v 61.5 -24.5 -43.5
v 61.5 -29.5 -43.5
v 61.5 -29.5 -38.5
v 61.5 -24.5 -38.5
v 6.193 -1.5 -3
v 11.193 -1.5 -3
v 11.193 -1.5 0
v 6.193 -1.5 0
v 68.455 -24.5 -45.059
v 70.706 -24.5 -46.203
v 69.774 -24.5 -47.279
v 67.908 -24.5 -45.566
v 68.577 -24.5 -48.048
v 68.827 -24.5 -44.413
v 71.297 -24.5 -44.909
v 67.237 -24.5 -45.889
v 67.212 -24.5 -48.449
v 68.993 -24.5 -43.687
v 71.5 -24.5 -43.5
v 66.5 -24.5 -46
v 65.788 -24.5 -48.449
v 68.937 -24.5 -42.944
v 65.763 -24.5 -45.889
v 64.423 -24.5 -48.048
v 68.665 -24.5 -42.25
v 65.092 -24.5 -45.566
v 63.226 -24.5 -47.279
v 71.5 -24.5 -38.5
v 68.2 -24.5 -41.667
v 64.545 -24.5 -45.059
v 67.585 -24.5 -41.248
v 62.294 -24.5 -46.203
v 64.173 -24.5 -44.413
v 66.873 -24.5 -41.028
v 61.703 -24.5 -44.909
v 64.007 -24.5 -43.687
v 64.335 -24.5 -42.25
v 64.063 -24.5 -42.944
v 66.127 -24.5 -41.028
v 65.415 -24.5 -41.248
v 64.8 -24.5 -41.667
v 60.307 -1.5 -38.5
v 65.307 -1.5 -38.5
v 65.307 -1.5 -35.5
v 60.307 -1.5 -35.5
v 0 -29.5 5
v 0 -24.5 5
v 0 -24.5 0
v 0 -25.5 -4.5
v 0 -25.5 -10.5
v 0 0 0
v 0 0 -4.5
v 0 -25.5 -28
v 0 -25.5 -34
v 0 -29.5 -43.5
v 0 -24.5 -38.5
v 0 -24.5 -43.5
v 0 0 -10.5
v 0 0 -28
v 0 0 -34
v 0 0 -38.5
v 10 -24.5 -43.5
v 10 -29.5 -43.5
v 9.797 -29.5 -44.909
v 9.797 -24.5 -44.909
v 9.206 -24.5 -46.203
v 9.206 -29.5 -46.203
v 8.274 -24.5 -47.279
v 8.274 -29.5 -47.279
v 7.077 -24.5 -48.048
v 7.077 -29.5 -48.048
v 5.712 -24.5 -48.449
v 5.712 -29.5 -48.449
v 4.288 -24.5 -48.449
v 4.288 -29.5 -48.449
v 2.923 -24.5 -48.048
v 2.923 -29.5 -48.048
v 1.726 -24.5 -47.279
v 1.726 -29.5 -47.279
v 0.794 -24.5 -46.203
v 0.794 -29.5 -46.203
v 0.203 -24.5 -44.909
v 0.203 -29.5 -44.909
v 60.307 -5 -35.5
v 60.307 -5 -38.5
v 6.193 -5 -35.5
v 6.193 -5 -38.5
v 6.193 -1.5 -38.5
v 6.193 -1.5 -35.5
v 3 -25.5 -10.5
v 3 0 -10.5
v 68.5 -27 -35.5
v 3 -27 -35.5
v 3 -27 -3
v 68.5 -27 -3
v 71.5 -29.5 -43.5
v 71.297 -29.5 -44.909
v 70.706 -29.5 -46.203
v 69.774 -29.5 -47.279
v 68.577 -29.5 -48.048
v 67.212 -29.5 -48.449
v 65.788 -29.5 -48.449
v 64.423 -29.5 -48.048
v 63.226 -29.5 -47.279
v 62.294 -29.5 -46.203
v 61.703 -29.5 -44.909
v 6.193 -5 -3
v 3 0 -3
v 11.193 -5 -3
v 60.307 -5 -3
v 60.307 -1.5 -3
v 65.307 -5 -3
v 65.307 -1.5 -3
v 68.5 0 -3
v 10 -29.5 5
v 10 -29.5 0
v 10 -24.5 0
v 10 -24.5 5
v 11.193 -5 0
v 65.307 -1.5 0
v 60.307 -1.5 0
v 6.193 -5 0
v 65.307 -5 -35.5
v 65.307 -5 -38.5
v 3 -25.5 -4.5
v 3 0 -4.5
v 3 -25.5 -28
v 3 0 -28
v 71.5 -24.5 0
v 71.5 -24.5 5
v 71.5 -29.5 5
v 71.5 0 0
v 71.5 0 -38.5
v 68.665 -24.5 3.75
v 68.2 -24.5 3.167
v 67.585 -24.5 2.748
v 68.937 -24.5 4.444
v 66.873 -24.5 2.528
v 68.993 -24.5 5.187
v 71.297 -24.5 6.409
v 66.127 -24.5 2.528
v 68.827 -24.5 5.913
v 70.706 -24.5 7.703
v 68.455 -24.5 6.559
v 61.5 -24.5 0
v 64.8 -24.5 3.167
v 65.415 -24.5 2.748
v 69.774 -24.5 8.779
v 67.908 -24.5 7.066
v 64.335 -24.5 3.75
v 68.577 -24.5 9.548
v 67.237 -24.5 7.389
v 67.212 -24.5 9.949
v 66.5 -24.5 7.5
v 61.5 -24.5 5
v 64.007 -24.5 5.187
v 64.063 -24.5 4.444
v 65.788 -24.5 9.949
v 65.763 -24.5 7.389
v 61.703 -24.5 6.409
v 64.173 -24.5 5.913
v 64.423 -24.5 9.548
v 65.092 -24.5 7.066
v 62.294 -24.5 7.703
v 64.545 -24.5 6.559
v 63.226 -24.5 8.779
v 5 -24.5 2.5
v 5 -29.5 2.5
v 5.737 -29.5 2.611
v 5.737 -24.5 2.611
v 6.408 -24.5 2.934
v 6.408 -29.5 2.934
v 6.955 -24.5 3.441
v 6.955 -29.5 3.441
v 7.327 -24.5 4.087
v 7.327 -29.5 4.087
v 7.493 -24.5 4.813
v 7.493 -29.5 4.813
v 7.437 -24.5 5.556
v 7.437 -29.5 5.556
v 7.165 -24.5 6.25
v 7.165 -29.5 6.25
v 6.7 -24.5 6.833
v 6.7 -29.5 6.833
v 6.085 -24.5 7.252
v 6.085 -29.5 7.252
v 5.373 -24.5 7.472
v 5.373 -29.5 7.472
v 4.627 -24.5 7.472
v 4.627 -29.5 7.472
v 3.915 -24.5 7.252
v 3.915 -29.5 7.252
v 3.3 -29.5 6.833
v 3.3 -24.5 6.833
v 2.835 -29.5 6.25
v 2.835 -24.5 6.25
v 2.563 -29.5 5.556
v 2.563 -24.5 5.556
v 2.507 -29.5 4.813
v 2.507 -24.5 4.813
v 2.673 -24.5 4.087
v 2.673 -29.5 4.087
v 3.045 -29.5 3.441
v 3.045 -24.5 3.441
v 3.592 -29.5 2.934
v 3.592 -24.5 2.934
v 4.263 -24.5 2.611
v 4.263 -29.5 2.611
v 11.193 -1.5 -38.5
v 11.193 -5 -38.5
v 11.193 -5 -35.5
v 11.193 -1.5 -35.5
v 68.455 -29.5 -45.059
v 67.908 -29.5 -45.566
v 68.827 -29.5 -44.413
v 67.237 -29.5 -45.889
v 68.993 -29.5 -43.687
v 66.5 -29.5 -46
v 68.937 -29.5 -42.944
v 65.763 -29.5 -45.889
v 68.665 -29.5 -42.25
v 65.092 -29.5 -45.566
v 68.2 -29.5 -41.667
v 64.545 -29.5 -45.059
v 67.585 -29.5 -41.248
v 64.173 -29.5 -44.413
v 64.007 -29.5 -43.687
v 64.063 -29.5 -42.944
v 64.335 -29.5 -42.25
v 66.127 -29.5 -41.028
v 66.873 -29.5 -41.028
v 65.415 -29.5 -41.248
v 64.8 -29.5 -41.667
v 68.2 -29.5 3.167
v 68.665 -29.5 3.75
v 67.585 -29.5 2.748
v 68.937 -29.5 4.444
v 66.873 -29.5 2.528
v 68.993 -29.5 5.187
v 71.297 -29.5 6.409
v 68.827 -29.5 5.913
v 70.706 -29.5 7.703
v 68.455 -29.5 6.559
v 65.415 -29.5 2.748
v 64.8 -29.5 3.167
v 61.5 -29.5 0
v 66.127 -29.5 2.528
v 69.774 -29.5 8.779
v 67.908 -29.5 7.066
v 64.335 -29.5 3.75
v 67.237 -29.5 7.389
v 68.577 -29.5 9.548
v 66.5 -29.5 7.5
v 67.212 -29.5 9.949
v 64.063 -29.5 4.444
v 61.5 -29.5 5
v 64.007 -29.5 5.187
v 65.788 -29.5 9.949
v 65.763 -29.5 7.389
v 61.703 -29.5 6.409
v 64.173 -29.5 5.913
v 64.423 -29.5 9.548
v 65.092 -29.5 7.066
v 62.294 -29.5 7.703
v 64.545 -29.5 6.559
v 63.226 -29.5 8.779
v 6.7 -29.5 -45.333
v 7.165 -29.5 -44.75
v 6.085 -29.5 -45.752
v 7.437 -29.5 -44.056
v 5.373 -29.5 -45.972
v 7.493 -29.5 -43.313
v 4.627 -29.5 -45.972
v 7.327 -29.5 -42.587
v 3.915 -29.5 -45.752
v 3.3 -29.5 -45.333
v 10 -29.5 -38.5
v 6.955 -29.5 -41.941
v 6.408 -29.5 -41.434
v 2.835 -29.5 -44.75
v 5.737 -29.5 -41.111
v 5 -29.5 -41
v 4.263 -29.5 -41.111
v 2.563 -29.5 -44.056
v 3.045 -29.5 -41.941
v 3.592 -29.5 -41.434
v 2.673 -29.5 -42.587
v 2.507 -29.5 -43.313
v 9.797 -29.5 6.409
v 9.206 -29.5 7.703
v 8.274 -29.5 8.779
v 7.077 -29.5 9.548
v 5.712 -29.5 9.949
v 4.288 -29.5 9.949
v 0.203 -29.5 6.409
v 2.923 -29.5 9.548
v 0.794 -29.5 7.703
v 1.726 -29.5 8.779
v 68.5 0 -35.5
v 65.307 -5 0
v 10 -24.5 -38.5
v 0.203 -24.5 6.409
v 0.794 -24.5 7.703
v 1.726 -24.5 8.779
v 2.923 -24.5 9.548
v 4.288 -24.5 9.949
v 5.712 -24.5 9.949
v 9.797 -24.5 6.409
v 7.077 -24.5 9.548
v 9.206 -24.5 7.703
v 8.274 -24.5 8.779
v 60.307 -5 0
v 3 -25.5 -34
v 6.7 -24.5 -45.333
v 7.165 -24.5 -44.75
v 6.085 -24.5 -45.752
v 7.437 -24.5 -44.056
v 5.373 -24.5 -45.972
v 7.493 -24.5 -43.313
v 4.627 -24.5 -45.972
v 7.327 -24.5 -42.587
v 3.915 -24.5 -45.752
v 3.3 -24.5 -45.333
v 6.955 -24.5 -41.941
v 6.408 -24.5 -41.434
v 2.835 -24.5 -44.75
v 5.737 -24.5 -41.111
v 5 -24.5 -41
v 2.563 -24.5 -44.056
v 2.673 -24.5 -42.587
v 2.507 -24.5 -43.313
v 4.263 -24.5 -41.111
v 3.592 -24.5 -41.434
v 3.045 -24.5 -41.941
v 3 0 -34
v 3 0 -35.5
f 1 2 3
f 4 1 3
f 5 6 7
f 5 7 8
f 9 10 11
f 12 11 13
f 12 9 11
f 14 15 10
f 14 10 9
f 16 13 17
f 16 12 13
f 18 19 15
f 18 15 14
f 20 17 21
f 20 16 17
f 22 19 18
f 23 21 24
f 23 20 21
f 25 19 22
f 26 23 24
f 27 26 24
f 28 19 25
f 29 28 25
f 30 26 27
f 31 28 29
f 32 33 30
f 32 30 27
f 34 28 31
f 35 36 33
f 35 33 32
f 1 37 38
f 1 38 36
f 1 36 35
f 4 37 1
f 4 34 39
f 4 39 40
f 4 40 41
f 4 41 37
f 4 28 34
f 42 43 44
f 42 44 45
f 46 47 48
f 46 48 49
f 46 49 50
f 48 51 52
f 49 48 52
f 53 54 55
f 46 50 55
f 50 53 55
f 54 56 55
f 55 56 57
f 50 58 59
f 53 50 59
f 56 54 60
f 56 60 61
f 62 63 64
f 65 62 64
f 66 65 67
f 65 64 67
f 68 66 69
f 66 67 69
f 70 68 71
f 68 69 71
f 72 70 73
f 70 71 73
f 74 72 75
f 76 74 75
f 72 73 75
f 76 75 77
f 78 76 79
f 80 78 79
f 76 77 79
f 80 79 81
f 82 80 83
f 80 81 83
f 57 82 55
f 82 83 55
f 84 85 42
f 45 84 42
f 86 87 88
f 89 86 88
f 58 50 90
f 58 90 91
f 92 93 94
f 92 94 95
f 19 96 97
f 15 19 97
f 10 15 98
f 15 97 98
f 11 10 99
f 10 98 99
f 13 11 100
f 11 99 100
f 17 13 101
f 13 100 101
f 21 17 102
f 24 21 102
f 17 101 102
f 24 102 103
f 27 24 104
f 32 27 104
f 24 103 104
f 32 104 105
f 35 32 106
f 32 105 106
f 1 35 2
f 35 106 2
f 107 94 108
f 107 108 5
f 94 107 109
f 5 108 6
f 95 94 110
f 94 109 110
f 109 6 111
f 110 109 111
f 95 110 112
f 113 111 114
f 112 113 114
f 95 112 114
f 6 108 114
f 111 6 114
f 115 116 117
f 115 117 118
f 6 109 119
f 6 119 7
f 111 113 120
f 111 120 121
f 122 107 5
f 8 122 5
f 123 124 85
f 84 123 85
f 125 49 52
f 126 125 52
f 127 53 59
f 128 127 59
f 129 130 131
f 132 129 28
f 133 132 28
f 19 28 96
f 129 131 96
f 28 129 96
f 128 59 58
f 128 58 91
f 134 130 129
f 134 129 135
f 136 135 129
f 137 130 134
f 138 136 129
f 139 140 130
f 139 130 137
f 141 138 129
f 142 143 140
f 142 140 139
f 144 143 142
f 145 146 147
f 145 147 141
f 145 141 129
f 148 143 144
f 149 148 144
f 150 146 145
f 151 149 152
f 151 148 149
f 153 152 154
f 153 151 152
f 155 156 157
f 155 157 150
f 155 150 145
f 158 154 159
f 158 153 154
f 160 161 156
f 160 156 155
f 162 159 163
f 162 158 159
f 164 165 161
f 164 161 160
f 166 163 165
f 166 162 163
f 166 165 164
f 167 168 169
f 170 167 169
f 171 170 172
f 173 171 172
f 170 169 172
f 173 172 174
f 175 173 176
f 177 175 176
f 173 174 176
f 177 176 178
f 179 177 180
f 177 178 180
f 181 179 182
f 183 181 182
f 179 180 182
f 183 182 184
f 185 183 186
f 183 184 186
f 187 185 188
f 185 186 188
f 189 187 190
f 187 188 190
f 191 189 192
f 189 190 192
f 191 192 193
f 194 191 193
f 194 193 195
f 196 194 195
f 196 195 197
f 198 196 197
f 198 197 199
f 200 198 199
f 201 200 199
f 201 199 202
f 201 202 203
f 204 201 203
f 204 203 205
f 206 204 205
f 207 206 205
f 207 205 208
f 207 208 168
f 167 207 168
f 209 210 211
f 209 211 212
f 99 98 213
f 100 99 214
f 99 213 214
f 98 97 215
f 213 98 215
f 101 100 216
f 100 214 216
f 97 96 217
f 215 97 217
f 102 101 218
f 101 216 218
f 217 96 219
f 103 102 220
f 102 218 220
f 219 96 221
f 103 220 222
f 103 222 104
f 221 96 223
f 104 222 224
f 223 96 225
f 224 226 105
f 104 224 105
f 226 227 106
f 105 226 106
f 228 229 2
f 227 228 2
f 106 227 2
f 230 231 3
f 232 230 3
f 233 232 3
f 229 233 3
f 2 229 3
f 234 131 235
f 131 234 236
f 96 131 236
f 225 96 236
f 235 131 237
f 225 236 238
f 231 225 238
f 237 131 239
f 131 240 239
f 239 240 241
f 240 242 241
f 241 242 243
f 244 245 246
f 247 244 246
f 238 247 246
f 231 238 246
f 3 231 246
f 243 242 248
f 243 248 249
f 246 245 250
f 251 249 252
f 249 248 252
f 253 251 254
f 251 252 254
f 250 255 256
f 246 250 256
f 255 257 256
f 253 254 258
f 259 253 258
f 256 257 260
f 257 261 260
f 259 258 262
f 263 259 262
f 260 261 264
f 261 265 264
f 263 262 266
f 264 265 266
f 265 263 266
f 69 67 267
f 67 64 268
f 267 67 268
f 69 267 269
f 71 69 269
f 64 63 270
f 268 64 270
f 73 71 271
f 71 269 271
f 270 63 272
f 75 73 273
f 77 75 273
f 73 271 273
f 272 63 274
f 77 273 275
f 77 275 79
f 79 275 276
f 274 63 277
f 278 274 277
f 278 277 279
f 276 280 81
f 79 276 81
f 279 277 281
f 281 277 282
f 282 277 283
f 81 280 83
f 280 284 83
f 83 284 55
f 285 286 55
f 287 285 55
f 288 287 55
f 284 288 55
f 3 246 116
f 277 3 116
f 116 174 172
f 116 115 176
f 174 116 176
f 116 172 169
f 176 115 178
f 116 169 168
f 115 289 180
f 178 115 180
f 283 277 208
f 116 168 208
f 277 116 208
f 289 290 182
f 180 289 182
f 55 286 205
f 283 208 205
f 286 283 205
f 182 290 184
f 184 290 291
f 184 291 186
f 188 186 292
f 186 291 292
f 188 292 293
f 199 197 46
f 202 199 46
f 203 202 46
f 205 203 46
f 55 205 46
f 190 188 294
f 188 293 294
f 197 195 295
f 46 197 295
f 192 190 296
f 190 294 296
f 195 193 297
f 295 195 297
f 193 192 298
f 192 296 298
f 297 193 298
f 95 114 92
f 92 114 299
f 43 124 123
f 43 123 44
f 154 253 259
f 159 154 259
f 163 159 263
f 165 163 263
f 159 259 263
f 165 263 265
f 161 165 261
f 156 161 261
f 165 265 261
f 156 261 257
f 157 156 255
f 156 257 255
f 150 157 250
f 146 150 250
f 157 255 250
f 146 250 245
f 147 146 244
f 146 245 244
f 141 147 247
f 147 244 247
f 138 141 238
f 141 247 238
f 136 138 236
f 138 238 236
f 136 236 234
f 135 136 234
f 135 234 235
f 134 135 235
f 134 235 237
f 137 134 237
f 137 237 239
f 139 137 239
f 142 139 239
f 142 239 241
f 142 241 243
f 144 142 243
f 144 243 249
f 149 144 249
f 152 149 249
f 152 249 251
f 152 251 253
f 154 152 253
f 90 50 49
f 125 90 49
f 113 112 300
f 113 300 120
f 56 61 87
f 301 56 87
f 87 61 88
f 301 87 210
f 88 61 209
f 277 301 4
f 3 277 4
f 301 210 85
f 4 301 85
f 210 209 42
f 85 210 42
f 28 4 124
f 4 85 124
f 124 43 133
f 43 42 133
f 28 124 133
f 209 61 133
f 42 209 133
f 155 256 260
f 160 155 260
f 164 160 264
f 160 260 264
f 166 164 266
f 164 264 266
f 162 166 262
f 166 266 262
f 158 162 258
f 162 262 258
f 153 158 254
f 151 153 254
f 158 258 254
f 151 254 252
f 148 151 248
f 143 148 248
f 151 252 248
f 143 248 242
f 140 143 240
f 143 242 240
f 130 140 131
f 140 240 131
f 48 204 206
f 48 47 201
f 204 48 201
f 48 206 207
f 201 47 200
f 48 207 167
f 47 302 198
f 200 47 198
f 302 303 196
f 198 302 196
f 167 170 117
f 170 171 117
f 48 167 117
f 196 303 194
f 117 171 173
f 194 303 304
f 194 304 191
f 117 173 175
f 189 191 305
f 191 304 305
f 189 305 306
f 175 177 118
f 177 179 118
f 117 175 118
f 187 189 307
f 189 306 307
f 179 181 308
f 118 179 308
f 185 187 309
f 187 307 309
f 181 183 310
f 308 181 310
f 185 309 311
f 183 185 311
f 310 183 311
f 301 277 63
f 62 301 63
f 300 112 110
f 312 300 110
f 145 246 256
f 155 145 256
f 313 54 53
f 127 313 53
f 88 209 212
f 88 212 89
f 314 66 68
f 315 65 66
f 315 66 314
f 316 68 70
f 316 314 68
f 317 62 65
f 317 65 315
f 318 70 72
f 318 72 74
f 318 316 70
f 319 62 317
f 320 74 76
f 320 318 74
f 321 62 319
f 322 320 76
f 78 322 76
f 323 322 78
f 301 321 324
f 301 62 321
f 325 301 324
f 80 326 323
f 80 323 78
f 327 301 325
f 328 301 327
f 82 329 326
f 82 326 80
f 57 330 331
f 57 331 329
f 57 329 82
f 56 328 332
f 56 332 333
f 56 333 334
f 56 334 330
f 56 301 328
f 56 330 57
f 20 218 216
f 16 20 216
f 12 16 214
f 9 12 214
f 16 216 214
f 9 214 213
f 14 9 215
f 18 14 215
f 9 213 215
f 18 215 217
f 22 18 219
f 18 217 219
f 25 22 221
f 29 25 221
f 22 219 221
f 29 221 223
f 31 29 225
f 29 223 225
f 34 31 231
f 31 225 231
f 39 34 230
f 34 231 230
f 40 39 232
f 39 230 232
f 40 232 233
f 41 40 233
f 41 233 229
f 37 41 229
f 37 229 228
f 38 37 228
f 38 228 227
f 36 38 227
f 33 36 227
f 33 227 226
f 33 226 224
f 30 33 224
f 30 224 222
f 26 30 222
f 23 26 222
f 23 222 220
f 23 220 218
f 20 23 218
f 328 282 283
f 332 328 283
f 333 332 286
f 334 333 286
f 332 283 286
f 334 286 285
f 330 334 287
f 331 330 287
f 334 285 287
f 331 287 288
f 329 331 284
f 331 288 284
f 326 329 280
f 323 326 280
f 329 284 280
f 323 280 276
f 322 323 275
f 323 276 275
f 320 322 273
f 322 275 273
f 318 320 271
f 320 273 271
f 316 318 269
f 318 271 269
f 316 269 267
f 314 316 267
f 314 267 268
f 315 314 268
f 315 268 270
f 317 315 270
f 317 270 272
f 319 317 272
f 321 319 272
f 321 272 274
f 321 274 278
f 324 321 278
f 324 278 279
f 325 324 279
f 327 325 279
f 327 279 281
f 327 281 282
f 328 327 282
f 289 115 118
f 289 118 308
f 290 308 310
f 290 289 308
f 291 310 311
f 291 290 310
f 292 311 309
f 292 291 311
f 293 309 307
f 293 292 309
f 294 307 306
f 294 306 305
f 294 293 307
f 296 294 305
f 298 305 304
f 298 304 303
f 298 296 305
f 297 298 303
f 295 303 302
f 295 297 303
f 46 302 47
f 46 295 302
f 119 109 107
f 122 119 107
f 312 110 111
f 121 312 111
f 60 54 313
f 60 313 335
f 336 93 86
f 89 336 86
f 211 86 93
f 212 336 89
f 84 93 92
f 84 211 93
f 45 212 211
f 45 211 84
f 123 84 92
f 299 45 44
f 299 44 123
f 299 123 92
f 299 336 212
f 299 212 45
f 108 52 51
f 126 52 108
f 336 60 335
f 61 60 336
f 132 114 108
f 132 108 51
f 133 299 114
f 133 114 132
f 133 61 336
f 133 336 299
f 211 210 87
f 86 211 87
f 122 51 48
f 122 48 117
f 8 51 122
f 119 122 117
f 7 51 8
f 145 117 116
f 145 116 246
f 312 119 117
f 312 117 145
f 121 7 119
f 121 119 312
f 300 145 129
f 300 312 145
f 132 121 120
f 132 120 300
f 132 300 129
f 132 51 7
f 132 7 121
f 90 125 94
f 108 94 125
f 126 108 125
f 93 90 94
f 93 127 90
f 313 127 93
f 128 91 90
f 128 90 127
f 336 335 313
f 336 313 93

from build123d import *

# Parameters (mm, degrees)
SKETCH1_W           = 71.5
SKETCH1_H           = 38.5
BOSS_EXTRUDE1_DEPTH = 29.5
SKETCH1_4_W         = 65.5
SKETCH1_4_H         = 32.5
CUT_EXTRUDE1_DEPTH  = 27
SKETCH3_W           = 6
SKETCH3_H           = 25.5
CUT_EXTRUDE2_DEPTH  = 29
BOSS_EXTRUDE3_DEPTH = 5
BOSS_EXTRUDE4_DEPTH = 5
BOSS_EXTRUDE5_DEPTH = 5
BOSS_EXTRUDE6_DEPTH = 5
SKETCH5_9_R         = 2.5
CUT_EXTRUDE3_DEPTH  = 15
SKETCH5_10_R        = 2.5
CUT_EXTRUDE4_DEPTH  = 20
SKETCH5_11_R        = 2.5
CUT_EXTRUDE5_DEPTH  = 20
SKETCH5_12_R        = 2.5
CUT_EXTRUDE6_DEPTH  = 20
SKETCH4_W           = 5
SKETCH4_H           = 3.5
CUT_EXTRUDE7_DEPTH  = 63
SKETCH4_3_W         = 5
SKETCH4_3_H         = 3.5
CUT_EXTRUDE8_DEPTH  = 63


with BuildPart() as part:
    # Sketch1 → Boss-Extrude1 (new body)
    with BuildSketch(Plane(origin=(0, 0, 0), x_dir=(1, 0, 0), z_dir=(0, 1, 0))):
        with Locations((35.75, 19.25)):
            Rectangle(SKETCH1_W, SKETCH1_H)
    extrude(amount=-BOSS_EXTRUDE1_DEPTH)

    # Sketch1<4> → Cut-Extrude1 (cut)
    with BuildSketch(Plane(origin=(0, 0, 0), x_dir=(1, 0, 0), z_dir=(0, 1, 0))):
        with Locations((35.75, 19.25)):
            Rectangle(SKETCH1_4_W, SKETCH1_4_H)
    extrude(amount=-CUT_EXTRUDE1_DEPTH, mode=Mode.SUBTRACT)

    # Sketch3 → Cut-Extrude2 (cut)
    with BuildSketch(Plane.ZY):
        with Locations((-7.5, -12.75)):
            Rectangle(SKETCH3_W, SKETCH3_H)
        with Locations((-31, -12.75)):
            Rectangle(SKETCH3_W, SKETCH3_H)
    extrude(amount=-CUT_EXTRUDE2_DEPTH, mode=Mode.SUBTRACT)

    # Sketch5 → Boss-Extrude3 (add)
    with BuildSketch(Plane.XZ.offset(29.5)):
        with BuildLine():
            Line((61.5, 0), (61.5, 5))
            ThreePointArc((61.5, 5), (66.5, 10), (71.5, 5))
            Line((71.5, 5), (71.5, 0))
            Line((71.5, 0), (61.5, 0))
        make_face()
    extrude(amount=-BOSS_EXTRUDE3_DEPTH)

    # Sketch5<5> → Boss-Extrude4 (add)
    with BuildSketch(Plane.XZ.offset(29.5)):
        with BuildLine():
            Line((0, 0), (10, 0))
            Line((10, 0), (10, 5))
            ThreePointArc((10, 5), (5, 10), (0, 5))
            Line((0, 5), (0, 0))
        make_face()
    extrude(amount=-BOSS_EXTRUDE4_DEPTH)

    # Sketch5<7> → Boss-Extrude5 (add)
    with BuildSketch(Plane.XZ.offset(29.5)):
        with BuildLine():
            Line((71.5, -38.5), (71.5, -43.5))
            ThreePointArc((71.5, -43.5), (66.5, -48.5), (61.5, -43.5))
            Line((61.5, -43.5), (61.5, -38.5))
            Line((61.5, -38.5), (71.5, -38.5))
        make_face()
    extrude(amount=-BOSS_EXTRUDE5_DEPTH)

    # Sketch5<8> → Boss-Extrude6 (add)
    with BuildSketch(Plane.XZ.offset(29.5)):
        with BuildLine():
            Line((10, -38.5), (10, -43.5))
            ThreePointArc((10, -43.5), (5, -48.5), (0, -43.5))
            Line((0, -43.5), (0, -38.5))
            Line((0, -38.5), (10, -38.5))
        make_face()
    extrude(amount=-BOSS_EXTRUDE6_DEPTH)

    # Sketch5<9> → Cut-Extrude3 (cut)
    with BuildSketch(Plane.XZ.offset(29.5)):
        with Locations((66.5, 5)):
            Circle(SKETCH5_9_R)
    extrude(amount=-CUT_EXTRUDE3_DEPTH, mode=Mode.SUBTRACT)

    # Sketch5<10> → Cut-Extrude4 (cut)
    with BuildSketch(Plane.XZ.offset(29.5)):
        with Locations((5, 5)):
            Circle(SKETCH5_10_R)
    extrude(amount=-CUT_EXTRUDE4_DEPTH, mode=Mode.SUBTRACT)

    # Sketch5<11> → Cut-Extrude5 (cut)
    with BuildSketch(Plane.XZ.offset(29.5)):
        with Locations((5, -43.5)):
            Circle(SKETCH5_11_R)
    extrude(amount=-CUT_EXTRUDE5_DEPTH, mode=Mode.SUBTRACT)

    # Sketch5<12> → Cut-Extrude6 (cut)
    with BuildSketch(Plane.XZ.offset(29.5)):
        with Locations((66.5, -43.5)):
            Circle(SKETCH5_12_R)
    extrude(amount=-CUT_EXTRUDE6_DEPTH, mode=Mode.SUBTRACT)

    # Sketch4 → Cut-Extrude7 (cut)
    with BuildSketch(Plane(origin=(0, 0, -38.5), x_dir=(-1, 0, 0), z_dir=(0, 0, -1))):
        with Locations((-62.806579946, -3.25)):
            Rectangle(SKETCH4_W, SKETCH4_H)
    extrude(amount=-CUT_EXTRUDE7_DEPTH, mode=Mode.SUBTRACT)

    # Sketch4<3> → Cut-Extrude8 (cut)
    with BuildSketch(Plane(origin=(0, 0, -38.5), x_dir=(-1, 0, 0), z_dir=(0, 0, -1))):
        with Locations((-8.693420054, -3.25)):
            Rectangle(SKETCH4_3_W, SKETCH4_3_H)
    extrude(amount=-CUT_EXTRUDE8_DEPTH, mode=Mode.SUBTRACT)


solid = part.part
